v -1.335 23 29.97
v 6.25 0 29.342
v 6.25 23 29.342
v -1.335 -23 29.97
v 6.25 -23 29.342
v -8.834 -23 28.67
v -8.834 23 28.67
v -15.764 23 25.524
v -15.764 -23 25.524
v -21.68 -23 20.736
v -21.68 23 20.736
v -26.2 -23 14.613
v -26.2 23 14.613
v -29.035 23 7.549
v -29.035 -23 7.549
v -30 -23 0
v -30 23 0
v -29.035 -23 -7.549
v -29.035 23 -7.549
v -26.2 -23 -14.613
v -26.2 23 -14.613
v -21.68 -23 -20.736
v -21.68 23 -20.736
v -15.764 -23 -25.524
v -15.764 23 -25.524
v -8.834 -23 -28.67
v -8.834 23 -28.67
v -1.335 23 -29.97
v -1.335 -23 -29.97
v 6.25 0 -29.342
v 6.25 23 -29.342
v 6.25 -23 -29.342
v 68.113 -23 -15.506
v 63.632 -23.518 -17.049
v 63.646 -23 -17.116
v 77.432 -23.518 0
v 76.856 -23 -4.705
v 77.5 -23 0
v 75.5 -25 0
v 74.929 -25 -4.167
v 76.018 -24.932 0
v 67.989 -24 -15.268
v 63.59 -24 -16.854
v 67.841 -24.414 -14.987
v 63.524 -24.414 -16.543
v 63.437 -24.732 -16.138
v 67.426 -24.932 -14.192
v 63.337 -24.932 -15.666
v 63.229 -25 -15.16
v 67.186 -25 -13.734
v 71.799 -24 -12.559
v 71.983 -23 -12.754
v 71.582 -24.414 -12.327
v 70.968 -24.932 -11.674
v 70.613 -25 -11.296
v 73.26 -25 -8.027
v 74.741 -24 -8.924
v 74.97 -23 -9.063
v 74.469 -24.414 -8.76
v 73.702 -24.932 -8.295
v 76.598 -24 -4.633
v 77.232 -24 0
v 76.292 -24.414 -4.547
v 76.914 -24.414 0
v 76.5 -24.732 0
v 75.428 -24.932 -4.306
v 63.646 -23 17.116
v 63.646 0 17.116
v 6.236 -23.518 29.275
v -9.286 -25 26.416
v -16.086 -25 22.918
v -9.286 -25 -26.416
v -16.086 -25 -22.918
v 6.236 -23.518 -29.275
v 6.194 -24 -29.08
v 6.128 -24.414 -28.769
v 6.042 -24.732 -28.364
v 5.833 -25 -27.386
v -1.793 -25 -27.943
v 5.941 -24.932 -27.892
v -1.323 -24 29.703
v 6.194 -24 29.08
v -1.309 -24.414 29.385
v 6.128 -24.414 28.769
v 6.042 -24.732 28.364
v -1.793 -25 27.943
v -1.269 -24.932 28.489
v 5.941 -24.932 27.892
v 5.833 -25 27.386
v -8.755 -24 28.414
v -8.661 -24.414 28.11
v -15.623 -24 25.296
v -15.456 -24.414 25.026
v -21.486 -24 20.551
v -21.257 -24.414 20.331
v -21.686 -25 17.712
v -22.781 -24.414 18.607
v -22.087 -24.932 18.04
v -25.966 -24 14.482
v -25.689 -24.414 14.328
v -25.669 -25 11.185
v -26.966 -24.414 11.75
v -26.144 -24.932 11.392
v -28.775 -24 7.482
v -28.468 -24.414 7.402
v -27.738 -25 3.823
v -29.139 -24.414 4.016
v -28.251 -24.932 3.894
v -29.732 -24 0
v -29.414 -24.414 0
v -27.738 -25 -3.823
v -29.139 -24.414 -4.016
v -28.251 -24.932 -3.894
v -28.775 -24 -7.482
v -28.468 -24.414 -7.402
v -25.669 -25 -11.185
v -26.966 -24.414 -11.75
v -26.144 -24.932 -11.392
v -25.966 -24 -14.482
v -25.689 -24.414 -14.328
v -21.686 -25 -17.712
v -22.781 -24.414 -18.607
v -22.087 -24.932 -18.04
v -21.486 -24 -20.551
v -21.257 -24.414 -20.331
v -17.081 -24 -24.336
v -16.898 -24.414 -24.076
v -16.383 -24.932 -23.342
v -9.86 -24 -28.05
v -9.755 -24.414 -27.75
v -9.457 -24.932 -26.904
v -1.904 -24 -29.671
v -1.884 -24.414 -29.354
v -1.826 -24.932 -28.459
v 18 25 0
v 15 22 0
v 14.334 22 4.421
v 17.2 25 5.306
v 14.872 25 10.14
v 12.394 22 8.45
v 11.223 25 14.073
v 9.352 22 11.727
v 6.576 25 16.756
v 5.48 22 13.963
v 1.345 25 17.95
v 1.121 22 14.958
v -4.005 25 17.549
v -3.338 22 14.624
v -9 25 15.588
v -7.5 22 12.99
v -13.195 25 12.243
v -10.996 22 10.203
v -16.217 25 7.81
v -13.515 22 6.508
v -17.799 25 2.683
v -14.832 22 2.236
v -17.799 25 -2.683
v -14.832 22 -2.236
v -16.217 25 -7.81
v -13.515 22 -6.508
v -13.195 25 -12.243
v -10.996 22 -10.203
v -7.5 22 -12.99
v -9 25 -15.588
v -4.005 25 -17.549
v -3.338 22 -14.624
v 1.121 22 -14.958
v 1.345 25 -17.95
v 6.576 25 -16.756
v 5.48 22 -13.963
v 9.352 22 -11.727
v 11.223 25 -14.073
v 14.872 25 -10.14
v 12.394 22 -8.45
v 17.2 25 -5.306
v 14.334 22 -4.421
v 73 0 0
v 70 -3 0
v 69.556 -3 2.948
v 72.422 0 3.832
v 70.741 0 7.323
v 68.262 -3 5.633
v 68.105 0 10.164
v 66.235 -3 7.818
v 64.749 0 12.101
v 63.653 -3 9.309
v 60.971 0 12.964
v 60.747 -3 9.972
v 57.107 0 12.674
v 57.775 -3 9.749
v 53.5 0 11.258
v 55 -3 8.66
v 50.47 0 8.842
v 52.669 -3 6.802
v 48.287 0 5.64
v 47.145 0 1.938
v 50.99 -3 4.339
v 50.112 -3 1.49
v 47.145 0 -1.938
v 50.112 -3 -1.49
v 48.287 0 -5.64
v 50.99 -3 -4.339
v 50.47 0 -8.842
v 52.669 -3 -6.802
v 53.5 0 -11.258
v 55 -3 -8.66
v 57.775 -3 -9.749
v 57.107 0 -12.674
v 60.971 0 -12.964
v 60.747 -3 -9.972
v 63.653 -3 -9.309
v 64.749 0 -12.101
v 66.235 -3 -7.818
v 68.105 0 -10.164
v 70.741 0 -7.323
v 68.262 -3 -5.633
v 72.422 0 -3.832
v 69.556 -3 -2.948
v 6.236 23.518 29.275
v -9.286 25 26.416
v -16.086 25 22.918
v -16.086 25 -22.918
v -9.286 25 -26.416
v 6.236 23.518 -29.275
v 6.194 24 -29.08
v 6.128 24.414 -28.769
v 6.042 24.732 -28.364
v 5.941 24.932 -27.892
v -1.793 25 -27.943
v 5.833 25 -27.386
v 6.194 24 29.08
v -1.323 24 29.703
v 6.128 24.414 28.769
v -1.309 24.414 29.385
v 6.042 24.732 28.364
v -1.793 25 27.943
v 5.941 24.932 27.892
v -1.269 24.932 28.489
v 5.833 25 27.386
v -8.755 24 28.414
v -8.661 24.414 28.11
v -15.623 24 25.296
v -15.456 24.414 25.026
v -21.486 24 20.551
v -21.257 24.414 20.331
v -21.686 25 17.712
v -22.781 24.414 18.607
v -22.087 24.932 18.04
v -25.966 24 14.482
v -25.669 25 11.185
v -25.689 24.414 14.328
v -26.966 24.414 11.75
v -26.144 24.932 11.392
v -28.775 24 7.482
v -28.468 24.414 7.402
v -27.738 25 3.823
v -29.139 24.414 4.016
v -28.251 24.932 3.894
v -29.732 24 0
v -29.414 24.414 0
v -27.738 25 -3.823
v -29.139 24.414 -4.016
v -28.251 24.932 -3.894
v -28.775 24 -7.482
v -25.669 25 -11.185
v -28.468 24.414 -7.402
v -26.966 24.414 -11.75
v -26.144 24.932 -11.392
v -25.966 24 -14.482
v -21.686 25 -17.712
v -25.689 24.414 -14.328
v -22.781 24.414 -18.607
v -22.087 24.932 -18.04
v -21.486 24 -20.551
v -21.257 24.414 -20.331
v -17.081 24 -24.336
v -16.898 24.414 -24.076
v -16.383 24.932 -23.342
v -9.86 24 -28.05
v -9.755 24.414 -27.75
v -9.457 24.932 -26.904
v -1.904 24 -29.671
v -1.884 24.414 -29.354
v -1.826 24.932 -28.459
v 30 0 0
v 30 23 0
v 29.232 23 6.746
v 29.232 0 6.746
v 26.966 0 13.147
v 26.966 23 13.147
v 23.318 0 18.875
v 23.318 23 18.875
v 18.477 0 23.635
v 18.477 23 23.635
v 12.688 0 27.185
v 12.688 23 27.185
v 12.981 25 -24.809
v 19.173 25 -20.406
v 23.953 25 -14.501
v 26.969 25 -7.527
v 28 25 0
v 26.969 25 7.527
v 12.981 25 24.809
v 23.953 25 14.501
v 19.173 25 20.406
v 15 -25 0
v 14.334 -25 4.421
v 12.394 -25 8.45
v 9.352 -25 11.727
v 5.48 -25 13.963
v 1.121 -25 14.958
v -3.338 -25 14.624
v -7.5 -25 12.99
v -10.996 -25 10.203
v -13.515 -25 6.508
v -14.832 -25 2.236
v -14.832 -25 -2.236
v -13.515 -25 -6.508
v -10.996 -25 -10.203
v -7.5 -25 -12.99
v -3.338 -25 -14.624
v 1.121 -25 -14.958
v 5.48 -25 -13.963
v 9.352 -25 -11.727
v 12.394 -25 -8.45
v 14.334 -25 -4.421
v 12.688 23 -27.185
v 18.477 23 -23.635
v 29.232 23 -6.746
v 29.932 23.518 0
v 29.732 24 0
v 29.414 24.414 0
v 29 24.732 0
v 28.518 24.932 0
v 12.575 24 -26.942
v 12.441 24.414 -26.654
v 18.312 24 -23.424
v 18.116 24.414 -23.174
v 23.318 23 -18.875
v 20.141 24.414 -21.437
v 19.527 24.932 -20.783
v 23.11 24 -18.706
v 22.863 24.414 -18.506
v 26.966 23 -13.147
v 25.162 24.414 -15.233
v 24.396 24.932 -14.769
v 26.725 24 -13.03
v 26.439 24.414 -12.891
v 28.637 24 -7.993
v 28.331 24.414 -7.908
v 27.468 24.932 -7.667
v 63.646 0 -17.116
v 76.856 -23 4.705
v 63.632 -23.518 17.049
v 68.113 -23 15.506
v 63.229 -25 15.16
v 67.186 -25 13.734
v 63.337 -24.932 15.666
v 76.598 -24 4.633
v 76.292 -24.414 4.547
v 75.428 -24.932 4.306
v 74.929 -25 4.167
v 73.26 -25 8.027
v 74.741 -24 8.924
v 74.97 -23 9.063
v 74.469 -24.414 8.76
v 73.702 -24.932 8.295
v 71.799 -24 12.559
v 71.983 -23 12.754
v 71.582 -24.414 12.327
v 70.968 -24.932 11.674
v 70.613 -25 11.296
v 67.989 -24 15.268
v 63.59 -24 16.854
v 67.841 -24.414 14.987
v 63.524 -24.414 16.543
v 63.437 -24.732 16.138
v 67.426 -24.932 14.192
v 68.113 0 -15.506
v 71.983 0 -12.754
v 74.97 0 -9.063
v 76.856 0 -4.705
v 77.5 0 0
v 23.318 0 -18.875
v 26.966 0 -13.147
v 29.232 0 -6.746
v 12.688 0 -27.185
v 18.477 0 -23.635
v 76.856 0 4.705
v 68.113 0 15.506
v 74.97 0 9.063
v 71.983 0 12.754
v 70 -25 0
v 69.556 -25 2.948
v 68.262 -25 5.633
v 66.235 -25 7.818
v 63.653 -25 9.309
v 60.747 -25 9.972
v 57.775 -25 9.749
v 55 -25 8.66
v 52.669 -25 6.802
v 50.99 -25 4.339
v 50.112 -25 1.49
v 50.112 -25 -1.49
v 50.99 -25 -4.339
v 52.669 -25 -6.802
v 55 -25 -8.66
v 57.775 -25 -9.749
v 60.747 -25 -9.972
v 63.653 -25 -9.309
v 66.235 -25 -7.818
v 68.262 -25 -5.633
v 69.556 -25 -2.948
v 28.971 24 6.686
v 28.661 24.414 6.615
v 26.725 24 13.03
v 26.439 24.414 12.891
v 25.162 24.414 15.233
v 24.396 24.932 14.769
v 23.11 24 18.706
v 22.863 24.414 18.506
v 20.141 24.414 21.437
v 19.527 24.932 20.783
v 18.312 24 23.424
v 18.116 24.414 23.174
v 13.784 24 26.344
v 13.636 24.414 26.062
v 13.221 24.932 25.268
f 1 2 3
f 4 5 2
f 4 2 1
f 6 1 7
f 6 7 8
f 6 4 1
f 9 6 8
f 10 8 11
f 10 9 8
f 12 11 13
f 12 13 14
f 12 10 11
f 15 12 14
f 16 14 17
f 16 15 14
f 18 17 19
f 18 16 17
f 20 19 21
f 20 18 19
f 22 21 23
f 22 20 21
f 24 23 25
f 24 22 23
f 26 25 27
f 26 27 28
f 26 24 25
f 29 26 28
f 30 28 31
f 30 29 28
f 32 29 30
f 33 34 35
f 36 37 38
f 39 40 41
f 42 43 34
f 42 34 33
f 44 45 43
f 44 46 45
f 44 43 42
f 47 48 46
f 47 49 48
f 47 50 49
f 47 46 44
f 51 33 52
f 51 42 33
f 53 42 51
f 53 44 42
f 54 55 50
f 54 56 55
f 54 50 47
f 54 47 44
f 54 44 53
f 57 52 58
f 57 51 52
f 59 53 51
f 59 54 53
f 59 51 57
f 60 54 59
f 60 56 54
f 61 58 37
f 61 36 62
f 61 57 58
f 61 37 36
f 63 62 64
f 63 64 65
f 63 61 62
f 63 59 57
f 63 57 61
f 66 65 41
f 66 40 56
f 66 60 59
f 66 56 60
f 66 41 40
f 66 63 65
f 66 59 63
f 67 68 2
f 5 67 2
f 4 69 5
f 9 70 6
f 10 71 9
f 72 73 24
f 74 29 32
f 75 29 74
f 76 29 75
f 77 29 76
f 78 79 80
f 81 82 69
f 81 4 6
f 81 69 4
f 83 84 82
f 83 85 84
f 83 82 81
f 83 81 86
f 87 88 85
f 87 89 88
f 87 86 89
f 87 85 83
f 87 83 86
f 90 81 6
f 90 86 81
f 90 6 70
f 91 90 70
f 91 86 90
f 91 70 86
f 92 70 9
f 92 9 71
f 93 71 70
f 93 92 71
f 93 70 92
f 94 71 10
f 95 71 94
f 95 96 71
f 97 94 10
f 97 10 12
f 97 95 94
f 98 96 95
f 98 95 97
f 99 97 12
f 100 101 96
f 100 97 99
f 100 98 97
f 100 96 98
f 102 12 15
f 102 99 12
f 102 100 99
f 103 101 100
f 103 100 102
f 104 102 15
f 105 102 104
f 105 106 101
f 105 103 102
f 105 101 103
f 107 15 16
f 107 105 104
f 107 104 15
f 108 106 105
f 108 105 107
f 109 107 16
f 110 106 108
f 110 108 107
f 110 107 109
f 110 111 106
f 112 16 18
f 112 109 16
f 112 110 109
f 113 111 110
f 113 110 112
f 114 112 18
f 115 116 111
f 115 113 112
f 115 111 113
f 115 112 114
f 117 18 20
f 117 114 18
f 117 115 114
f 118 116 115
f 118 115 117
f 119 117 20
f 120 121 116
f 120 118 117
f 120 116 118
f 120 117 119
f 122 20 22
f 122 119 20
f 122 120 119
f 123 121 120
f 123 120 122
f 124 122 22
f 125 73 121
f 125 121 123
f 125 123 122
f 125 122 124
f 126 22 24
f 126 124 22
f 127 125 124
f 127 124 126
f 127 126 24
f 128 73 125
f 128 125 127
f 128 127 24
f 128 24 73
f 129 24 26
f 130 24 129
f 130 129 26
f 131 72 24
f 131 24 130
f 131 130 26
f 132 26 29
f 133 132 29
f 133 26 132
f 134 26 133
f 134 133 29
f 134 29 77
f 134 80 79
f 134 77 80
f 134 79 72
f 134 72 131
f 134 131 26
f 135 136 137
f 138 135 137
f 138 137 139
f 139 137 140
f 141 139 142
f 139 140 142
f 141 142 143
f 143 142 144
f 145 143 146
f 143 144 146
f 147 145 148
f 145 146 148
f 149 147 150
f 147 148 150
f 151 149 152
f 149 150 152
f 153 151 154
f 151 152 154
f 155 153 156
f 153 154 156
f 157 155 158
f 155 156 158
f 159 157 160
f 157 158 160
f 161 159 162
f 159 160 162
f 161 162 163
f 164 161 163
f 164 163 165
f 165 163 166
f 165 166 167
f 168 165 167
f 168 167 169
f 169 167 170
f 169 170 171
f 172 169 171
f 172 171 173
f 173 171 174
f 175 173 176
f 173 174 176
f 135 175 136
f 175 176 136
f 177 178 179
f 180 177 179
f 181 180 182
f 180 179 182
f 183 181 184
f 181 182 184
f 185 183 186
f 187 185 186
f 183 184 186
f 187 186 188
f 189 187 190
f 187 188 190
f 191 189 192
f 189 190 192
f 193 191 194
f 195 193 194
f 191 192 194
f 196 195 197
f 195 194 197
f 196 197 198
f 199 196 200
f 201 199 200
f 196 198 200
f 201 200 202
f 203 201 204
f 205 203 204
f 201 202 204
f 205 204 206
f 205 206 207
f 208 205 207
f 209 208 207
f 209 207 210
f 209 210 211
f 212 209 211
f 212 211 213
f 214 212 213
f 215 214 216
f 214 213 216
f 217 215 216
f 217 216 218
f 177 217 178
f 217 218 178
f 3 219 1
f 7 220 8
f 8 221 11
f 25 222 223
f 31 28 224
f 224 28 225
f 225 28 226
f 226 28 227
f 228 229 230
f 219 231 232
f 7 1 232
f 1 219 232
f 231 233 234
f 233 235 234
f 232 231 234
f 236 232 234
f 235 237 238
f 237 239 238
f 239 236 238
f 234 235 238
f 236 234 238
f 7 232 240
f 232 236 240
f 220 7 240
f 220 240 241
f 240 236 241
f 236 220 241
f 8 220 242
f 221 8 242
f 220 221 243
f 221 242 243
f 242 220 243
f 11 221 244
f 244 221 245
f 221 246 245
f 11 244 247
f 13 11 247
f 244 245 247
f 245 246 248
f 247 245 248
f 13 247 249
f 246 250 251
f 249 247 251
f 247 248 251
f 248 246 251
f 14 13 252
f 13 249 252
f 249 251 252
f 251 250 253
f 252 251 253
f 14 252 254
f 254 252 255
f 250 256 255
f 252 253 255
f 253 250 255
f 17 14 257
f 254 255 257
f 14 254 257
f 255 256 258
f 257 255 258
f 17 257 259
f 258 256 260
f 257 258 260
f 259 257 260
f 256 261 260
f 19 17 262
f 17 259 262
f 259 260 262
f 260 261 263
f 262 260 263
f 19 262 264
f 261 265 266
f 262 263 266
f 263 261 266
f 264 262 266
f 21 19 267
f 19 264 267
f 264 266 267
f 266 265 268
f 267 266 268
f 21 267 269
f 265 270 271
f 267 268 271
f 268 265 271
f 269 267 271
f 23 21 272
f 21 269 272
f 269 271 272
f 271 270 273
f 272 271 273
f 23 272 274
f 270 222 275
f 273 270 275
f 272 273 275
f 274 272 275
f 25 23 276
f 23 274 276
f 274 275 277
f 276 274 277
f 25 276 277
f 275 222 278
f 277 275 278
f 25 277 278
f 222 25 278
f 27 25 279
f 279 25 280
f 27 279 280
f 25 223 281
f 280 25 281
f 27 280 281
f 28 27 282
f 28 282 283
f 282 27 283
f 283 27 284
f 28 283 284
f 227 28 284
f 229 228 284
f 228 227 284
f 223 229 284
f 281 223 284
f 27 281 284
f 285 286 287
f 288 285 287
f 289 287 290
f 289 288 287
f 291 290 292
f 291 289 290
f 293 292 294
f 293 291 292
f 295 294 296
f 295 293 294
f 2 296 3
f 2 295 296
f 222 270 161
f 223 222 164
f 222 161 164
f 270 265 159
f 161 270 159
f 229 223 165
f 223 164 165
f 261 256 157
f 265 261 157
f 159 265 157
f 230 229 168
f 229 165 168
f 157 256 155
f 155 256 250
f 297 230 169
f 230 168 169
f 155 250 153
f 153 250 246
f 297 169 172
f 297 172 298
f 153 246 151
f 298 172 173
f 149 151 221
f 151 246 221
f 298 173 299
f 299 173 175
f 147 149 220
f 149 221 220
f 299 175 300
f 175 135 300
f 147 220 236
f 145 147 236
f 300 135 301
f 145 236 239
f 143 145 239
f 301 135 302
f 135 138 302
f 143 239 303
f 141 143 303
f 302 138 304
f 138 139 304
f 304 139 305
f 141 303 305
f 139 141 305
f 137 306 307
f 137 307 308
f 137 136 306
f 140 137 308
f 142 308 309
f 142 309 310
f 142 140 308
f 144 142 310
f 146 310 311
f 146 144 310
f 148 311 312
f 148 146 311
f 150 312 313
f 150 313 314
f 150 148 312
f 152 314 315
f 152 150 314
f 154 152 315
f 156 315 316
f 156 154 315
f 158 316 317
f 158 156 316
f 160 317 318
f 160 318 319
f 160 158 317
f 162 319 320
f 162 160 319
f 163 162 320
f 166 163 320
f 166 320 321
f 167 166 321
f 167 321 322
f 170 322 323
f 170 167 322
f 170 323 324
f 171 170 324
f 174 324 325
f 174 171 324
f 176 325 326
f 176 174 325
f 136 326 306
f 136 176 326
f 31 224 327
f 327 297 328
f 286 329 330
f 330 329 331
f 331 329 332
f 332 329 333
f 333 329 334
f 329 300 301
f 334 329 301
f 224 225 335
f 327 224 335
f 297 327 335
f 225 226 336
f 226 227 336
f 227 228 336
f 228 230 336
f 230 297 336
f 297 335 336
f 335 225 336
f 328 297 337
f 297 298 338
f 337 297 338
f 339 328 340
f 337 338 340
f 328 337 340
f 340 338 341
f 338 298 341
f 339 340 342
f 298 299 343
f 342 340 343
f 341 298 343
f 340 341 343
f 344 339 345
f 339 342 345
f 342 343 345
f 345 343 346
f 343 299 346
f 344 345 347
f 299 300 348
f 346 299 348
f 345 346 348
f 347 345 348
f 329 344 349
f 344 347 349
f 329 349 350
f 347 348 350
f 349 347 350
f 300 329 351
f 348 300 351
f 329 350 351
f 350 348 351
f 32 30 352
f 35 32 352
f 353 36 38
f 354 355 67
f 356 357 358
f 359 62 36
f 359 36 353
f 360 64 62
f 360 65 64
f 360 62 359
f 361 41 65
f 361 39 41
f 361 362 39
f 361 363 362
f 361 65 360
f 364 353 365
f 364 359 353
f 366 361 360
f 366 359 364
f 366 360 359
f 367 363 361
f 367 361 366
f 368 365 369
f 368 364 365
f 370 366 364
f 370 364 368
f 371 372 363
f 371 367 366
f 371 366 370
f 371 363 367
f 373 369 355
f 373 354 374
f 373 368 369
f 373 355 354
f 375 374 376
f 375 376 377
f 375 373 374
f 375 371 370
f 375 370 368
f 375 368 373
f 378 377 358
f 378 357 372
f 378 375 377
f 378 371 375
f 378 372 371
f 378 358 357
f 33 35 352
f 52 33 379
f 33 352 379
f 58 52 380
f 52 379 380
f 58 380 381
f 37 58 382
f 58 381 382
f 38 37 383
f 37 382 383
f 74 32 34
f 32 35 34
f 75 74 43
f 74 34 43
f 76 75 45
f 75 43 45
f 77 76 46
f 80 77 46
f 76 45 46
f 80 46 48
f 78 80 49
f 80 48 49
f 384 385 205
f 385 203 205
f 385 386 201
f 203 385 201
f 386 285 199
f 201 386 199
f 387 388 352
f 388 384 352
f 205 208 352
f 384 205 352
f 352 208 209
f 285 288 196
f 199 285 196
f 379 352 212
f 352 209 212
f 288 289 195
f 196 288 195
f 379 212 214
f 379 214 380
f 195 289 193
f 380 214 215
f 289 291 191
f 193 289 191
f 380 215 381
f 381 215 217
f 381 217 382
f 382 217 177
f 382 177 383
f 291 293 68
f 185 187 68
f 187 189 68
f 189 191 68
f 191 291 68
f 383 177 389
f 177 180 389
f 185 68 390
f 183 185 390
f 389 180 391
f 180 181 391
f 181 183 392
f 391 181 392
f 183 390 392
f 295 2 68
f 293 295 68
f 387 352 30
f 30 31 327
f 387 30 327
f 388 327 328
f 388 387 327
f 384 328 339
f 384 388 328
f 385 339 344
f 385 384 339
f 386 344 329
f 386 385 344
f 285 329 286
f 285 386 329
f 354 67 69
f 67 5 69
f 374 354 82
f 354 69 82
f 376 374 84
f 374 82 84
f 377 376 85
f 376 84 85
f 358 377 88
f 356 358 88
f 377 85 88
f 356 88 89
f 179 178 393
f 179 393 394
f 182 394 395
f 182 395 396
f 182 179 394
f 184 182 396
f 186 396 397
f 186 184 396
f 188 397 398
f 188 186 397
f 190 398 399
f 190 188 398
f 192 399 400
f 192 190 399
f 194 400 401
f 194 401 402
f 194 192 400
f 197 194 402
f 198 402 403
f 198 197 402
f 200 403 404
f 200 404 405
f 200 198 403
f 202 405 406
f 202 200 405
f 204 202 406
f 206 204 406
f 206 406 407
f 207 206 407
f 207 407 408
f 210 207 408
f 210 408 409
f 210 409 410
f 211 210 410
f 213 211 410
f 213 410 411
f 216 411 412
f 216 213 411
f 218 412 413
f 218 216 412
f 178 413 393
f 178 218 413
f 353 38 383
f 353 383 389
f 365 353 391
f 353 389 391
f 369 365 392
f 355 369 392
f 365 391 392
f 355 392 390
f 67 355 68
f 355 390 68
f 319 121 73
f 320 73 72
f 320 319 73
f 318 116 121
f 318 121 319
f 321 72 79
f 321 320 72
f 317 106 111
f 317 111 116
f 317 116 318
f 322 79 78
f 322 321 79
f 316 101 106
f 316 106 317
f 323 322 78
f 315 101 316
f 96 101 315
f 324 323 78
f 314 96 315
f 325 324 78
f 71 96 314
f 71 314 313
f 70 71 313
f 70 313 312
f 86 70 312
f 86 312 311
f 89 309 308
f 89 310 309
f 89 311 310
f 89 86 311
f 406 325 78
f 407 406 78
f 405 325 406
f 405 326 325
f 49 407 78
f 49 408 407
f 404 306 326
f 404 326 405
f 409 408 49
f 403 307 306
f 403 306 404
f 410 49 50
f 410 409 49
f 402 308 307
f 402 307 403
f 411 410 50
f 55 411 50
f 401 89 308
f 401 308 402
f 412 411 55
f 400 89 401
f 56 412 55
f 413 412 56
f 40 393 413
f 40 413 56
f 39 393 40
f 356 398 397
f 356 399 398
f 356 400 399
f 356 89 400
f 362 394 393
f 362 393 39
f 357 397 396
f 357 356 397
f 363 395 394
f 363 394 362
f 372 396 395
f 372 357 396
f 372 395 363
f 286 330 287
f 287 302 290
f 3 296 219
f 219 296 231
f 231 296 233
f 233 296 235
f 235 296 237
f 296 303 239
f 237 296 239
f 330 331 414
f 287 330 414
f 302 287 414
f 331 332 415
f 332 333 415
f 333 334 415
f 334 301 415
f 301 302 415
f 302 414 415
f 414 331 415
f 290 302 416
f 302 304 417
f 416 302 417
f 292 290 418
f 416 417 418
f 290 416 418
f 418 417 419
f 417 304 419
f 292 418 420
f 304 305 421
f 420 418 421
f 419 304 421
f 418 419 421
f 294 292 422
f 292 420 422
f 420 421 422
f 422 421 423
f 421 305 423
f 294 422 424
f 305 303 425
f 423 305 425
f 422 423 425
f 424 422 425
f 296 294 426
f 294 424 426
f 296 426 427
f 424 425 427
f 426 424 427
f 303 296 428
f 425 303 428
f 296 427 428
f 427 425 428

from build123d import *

# Parameters (mm, degrees)
F0_R     = 15
F0_R_2   = 10
F1_DEPTH = 25
F2_DEPTH = 25
F3_R     = 2
F4_SIZE  = 3


with BuildPart() as f1:
    # F0 (on Front) → F1 (new body)
    with BuildSketch(Plane.XZ):
        with BuildLine():
            ThreePointArc((6.25, -29.341736), (23.318448, -18.874586), (30, 0))
            ThreePointArc((30, 0), (23.318448, 18.874586), (6.25, 29.341736))
            ThreePointArc((6.25, 29.341736), (-30, 0), (6.25, -29.341736))
        make_face()
        Circle(F0_R, mode=Mode.SUBTRACT)
        with BuildLine():
            ThreePointArc((6.25, 29.341736), (23.318448, 18.874586), (30, 0))
            ThreePointArc((30, 0), (23.318448, -18.874586), (6.25, -29.341736))
            Line((6.25, -29.341736), (63.645833, -17.116013))
            ThreePointArc((63.645833, -17.116013), (42.5, 0), (63.645833, 17.116013))
            Line((63.645833, 17.116013), (6.25, 29.341736))
        make_face()
        with BuildLine():
            ThreePointArc((77.5, 0), (73.602428, 11.010175), (63.645833, 17.116013))
            ThreePointArc((63.645833, 17.116013), (42.5, 0), (63.645833, -17.116013))
            ThreePointArc((63.645833, -17.116013), (73.602428, -11.010175), (77.5, 0))
        make_face()
        with Locations((60, 0)):
            Circle(F0_R_2, mode=Mode.SUBTRACT)
    extrude(amount=F1_DEPTH)

    # F0 (on Front) → F2 (join)
    with BuildSketch(Plane.XZ):
        with BuildLine():
            ThreePointArc((6.25, -29.341736), (23.318448, -18.874586), (30, 0))
            ThreePointArc((30, 0), (23.318448, 18.874586), (6.25, 29.341736))
            ThreePointArc((6.25, 29.341736), (-30, 0), (6.25, -29.341736))
        make_face()
        Circle(F0_R, mode=Mode.SUBTRACT)
    extrude(amount=-F2_DEPTH)

    # F3
    f3_edges = [f1.edges().sort_by_distance(p)[0] for p in [
        (-6.25, 25, 29.341736),
        (34.947917, -25, 23.228875),
    ]]
    fillet(f3_edges, radius=F3_R)

    # F4
    f4_edges = [f1.edges().sort_by_distance(p)[0] for p in [
        (-15, 25, 0),
        (50, 0, 0),
    ]]
    chamfer(f4_edges, length=F4_SIZE)


solid = f1.part
